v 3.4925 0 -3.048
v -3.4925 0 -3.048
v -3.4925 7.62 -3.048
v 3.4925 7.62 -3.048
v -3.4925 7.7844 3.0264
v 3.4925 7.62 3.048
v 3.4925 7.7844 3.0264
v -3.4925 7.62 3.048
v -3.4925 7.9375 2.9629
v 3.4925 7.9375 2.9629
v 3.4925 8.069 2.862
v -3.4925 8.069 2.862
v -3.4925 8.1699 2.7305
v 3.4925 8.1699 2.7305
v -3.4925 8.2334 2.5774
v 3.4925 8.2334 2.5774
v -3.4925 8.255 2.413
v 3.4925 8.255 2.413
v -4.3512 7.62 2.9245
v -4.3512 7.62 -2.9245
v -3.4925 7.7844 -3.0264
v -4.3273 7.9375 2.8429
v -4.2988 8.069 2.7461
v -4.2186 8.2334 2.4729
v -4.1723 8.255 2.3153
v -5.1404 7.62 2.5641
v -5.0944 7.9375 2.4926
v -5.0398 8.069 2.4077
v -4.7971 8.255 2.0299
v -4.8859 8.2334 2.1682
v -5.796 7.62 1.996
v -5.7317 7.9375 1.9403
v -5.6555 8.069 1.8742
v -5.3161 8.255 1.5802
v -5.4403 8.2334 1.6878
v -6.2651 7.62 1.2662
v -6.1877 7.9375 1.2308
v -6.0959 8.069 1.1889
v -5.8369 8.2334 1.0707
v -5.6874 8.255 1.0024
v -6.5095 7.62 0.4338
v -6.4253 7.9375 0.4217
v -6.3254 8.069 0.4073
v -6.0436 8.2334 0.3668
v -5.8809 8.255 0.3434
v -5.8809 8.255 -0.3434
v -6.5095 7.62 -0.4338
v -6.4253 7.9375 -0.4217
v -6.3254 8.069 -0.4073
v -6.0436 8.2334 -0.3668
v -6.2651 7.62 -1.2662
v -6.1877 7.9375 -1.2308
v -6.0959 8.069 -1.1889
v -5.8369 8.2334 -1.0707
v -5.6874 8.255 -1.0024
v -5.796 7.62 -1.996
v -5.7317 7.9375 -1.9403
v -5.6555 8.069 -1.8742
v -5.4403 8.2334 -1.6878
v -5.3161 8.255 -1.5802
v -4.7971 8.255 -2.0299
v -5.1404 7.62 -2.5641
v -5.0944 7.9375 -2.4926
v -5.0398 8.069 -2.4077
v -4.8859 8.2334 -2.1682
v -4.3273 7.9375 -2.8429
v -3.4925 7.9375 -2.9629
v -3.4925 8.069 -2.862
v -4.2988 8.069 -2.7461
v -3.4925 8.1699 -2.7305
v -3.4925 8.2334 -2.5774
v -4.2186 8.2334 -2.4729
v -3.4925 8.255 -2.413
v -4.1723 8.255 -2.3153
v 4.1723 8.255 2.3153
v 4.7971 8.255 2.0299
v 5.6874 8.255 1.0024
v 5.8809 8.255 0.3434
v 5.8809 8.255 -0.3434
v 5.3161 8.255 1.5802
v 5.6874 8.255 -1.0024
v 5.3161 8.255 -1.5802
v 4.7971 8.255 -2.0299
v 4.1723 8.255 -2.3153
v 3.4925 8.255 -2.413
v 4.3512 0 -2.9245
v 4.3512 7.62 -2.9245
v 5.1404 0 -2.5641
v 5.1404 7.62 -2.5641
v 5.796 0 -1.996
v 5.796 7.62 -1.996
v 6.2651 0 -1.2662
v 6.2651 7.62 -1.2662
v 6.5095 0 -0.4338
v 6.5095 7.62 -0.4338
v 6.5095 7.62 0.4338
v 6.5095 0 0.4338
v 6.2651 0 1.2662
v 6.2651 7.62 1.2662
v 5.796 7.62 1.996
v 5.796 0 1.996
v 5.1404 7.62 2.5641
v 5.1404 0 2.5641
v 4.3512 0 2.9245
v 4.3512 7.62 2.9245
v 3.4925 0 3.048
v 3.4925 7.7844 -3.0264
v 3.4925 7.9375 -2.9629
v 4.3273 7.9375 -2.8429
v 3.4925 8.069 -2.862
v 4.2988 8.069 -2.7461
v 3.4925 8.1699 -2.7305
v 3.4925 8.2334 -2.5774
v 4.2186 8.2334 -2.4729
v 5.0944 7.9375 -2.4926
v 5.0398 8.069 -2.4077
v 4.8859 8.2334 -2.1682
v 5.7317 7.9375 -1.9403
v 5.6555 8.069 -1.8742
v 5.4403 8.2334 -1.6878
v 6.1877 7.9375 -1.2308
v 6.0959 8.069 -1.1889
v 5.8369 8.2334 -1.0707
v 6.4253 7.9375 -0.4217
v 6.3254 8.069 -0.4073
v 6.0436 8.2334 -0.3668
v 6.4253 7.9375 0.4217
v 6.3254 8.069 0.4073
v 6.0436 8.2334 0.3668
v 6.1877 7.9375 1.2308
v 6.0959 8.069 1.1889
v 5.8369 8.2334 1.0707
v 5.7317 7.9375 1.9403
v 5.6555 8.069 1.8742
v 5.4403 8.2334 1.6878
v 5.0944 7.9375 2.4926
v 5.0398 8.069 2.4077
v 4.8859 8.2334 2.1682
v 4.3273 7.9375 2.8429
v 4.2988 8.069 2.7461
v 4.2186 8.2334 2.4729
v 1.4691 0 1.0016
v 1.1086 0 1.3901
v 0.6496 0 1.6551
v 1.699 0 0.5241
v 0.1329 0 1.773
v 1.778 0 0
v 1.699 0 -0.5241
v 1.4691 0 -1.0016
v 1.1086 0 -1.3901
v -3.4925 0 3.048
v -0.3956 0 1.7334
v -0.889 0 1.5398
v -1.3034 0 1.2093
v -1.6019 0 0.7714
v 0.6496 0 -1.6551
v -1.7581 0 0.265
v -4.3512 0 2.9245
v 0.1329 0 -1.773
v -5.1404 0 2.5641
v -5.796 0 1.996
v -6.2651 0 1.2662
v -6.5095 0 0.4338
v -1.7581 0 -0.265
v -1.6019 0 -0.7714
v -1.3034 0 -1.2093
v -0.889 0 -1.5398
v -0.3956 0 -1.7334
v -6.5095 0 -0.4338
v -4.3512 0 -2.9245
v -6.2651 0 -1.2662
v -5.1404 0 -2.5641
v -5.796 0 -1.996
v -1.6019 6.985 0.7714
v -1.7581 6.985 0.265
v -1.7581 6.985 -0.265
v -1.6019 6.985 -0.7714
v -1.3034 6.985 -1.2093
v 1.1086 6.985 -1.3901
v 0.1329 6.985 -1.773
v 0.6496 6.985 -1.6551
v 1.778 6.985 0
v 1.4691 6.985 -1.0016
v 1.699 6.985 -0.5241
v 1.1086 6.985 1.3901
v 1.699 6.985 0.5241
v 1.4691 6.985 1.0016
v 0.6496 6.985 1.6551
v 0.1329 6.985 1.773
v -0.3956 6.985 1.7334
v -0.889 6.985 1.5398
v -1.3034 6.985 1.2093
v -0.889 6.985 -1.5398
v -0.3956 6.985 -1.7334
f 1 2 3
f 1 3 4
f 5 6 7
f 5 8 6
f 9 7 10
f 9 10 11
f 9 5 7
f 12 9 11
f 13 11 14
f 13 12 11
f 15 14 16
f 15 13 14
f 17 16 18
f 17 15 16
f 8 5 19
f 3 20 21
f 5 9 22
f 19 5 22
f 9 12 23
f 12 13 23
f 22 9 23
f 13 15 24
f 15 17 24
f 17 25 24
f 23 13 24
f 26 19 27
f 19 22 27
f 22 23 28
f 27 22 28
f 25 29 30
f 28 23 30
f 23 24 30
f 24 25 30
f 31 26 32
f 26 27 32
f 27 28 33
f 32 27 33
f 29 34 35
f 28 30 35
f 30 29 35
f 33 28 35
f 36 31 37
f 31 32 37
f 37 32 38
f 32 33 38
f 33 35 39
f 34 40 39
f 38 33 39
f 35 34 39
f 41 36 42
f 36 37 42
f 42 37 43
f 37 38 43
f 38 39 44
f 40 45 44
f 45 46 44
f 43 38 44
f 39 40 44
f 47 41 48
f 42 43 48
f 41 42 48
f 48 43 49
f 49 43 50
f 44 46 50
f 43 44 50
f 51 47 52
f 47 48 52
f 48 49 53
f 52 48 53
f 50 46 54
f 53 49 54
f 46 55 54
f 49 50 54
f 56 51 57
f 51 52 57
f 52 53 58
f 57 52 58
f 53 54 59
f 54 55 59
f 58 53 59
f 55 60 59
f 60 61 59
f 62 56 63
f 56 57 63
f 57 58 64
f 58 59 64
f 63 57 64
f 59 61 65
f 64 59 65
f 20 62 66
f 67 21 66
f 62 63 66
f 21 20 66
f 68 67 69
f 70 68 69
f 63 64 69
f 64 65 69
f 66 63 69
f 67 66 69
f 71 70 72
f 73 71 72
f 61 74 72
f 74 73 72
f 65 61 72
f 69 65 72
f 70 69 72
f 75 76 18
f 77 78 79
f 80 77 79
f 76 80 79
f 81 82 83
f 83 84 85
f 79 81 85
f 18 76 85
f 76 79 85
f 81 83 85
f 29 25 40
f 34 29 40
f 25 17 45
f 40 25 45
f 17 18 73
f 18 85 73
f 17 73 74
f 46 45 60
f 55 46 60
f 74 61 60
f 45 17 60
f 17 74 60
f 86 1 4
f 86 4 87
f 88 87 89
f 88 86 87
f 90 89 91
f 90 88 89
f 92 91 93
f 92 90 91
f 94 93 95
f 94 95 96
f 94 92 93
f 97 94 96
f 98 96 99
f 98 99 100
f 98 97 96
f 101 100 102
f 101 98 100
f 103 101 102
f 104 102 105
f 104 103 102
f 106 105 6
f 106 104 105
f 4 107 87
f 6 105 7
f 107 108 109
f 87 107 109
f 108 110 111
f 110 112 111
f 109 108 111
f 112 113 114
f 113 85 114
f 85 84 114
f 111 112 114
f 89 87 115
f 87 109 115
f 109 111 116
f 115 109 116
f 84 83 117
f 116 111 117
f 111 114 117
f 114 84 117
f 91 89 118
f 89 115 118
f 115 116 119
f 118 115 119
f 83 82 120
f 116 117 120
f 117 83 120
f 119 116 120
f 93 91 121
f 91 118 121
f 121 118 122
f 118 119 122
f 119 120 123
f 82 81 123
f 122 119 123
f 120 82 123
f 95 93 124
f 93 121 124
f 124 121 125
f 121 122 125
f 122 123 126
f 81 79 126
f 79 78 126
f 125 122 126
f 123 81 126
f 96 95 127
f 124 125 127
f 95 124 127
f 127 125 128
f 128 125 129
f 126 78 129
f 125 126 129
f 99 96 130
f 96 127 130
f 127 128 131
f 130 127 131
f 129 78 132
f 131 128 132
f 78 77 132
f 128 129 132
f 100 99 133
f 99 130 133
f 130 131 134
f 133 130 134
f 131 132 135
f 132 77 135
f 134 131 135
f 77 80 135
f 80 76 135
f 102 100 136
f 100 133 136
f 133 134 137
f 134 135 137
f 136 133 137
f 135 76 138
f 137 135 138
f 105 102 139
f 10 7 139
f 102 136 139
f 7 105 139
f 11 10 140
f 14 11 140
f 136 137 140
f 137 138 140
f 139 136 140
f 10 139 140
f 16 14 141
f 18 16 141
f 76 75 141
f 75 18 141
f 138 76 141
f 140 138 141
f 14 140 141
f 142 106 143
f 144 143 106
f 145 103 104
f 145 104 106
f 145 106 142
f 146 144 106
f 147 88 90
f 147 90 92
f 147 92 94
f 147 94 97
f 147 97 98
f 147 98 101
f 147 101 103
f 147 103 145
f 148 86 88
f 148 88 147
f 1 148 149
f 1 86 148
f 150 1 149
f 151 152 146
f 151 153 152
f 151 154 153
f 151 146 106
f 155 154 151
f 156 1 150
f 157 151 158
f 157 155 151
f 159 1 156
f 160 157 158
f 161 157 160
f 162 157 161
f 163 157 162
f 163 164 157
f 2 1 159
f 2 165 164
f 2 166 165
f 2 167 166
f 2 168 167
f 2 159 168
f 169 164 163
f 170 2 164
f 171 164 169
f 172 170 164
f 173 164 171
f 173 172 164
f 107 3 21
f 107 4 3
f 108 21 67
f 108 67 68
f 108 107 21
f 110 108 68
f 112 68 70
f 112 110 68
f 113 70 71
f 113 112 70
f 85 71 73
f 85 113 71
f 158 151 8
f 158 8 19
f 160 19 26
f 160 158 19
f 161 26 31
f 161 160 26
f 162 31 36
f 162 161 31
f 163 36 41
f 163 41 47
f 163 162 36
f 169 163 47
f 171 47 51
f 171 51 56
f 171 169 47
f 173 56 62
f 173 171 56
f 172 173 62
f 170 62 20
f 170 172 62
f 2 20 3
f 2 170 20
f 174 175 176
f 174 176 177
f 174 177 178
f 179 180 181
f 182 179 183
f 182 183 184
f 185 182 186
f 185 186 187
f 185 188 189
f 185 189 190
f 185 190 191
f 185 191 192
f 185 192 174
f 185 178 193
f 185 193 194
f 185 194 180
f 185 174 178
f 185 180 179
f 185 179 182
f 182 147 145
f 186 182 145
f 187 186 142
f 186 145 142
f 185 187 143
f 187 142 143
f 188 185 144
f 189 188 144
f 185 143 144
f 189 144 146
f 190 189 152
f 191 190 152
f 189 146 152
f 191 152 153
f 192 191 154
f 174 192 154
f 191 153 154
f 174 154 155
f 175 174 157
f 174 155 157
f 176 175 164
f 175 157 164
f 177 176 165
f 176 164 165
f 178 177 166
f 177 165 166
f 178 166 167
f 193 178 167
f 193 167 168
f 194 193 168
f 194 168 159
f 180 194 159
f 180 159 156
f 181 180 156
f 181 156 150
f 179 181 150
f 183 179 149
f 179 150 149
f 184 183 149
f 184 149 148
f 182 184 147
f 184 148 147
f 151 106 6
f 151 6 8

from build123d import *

# Parameters (mm, degrees)
BOSS_EXTRUDE1_DEPTH = 8.255
FILLET1_R           = 0.635
SKETCH2_R           = 1.778
CUT_EXTRUDE3_DEPTH  = 6.985


with BuildPart() as part:
    # Sketch1 → Boss-Extrude1 (new body)
    with BuildSketch(Plane(origin=(0, 0, 0), x_dir=(1, 0, 0), z_dir=(0, 1, 0))):
        with BuildLine():
            Line((-3.4925, 3.048), (3.4925, 3.048))
            ThreePointArc((3.4925, 3.048), (6.5405, 0), (3.4925, -3.048))
            Line((3.4925, -3.048), (-3.4925, -3.048))
            ThreePointArc((-3.4925, -3.048), (-6.5405, 0), (-3.4925, 3.048))
        make_face()
    extrude(amount=BOSS_EXTRUDE1_DEPTH)

    # Fillet1
    fillet1_edges = [part.edges().sort_by_distance(p)[0] for p in [
        (6.5405, 8.255, 0),
        (0, 8.255, -3.048),
        (-6.5405, 8.255, 0),
        (0, 8.255, 3.048),
    ]]
    fillet(fillet1_edges, radius=FILLET1_R)

    # Sketch2 → Cut-Extrude3 (cut)
    with BuildSketch(Plane.XZ):
        Circle(SKETCH2_R)
    extrude(amount=-CUT_EXTRUDE3_DEPTH, mode=Mode.SUBTRACT)


solid = part.part
